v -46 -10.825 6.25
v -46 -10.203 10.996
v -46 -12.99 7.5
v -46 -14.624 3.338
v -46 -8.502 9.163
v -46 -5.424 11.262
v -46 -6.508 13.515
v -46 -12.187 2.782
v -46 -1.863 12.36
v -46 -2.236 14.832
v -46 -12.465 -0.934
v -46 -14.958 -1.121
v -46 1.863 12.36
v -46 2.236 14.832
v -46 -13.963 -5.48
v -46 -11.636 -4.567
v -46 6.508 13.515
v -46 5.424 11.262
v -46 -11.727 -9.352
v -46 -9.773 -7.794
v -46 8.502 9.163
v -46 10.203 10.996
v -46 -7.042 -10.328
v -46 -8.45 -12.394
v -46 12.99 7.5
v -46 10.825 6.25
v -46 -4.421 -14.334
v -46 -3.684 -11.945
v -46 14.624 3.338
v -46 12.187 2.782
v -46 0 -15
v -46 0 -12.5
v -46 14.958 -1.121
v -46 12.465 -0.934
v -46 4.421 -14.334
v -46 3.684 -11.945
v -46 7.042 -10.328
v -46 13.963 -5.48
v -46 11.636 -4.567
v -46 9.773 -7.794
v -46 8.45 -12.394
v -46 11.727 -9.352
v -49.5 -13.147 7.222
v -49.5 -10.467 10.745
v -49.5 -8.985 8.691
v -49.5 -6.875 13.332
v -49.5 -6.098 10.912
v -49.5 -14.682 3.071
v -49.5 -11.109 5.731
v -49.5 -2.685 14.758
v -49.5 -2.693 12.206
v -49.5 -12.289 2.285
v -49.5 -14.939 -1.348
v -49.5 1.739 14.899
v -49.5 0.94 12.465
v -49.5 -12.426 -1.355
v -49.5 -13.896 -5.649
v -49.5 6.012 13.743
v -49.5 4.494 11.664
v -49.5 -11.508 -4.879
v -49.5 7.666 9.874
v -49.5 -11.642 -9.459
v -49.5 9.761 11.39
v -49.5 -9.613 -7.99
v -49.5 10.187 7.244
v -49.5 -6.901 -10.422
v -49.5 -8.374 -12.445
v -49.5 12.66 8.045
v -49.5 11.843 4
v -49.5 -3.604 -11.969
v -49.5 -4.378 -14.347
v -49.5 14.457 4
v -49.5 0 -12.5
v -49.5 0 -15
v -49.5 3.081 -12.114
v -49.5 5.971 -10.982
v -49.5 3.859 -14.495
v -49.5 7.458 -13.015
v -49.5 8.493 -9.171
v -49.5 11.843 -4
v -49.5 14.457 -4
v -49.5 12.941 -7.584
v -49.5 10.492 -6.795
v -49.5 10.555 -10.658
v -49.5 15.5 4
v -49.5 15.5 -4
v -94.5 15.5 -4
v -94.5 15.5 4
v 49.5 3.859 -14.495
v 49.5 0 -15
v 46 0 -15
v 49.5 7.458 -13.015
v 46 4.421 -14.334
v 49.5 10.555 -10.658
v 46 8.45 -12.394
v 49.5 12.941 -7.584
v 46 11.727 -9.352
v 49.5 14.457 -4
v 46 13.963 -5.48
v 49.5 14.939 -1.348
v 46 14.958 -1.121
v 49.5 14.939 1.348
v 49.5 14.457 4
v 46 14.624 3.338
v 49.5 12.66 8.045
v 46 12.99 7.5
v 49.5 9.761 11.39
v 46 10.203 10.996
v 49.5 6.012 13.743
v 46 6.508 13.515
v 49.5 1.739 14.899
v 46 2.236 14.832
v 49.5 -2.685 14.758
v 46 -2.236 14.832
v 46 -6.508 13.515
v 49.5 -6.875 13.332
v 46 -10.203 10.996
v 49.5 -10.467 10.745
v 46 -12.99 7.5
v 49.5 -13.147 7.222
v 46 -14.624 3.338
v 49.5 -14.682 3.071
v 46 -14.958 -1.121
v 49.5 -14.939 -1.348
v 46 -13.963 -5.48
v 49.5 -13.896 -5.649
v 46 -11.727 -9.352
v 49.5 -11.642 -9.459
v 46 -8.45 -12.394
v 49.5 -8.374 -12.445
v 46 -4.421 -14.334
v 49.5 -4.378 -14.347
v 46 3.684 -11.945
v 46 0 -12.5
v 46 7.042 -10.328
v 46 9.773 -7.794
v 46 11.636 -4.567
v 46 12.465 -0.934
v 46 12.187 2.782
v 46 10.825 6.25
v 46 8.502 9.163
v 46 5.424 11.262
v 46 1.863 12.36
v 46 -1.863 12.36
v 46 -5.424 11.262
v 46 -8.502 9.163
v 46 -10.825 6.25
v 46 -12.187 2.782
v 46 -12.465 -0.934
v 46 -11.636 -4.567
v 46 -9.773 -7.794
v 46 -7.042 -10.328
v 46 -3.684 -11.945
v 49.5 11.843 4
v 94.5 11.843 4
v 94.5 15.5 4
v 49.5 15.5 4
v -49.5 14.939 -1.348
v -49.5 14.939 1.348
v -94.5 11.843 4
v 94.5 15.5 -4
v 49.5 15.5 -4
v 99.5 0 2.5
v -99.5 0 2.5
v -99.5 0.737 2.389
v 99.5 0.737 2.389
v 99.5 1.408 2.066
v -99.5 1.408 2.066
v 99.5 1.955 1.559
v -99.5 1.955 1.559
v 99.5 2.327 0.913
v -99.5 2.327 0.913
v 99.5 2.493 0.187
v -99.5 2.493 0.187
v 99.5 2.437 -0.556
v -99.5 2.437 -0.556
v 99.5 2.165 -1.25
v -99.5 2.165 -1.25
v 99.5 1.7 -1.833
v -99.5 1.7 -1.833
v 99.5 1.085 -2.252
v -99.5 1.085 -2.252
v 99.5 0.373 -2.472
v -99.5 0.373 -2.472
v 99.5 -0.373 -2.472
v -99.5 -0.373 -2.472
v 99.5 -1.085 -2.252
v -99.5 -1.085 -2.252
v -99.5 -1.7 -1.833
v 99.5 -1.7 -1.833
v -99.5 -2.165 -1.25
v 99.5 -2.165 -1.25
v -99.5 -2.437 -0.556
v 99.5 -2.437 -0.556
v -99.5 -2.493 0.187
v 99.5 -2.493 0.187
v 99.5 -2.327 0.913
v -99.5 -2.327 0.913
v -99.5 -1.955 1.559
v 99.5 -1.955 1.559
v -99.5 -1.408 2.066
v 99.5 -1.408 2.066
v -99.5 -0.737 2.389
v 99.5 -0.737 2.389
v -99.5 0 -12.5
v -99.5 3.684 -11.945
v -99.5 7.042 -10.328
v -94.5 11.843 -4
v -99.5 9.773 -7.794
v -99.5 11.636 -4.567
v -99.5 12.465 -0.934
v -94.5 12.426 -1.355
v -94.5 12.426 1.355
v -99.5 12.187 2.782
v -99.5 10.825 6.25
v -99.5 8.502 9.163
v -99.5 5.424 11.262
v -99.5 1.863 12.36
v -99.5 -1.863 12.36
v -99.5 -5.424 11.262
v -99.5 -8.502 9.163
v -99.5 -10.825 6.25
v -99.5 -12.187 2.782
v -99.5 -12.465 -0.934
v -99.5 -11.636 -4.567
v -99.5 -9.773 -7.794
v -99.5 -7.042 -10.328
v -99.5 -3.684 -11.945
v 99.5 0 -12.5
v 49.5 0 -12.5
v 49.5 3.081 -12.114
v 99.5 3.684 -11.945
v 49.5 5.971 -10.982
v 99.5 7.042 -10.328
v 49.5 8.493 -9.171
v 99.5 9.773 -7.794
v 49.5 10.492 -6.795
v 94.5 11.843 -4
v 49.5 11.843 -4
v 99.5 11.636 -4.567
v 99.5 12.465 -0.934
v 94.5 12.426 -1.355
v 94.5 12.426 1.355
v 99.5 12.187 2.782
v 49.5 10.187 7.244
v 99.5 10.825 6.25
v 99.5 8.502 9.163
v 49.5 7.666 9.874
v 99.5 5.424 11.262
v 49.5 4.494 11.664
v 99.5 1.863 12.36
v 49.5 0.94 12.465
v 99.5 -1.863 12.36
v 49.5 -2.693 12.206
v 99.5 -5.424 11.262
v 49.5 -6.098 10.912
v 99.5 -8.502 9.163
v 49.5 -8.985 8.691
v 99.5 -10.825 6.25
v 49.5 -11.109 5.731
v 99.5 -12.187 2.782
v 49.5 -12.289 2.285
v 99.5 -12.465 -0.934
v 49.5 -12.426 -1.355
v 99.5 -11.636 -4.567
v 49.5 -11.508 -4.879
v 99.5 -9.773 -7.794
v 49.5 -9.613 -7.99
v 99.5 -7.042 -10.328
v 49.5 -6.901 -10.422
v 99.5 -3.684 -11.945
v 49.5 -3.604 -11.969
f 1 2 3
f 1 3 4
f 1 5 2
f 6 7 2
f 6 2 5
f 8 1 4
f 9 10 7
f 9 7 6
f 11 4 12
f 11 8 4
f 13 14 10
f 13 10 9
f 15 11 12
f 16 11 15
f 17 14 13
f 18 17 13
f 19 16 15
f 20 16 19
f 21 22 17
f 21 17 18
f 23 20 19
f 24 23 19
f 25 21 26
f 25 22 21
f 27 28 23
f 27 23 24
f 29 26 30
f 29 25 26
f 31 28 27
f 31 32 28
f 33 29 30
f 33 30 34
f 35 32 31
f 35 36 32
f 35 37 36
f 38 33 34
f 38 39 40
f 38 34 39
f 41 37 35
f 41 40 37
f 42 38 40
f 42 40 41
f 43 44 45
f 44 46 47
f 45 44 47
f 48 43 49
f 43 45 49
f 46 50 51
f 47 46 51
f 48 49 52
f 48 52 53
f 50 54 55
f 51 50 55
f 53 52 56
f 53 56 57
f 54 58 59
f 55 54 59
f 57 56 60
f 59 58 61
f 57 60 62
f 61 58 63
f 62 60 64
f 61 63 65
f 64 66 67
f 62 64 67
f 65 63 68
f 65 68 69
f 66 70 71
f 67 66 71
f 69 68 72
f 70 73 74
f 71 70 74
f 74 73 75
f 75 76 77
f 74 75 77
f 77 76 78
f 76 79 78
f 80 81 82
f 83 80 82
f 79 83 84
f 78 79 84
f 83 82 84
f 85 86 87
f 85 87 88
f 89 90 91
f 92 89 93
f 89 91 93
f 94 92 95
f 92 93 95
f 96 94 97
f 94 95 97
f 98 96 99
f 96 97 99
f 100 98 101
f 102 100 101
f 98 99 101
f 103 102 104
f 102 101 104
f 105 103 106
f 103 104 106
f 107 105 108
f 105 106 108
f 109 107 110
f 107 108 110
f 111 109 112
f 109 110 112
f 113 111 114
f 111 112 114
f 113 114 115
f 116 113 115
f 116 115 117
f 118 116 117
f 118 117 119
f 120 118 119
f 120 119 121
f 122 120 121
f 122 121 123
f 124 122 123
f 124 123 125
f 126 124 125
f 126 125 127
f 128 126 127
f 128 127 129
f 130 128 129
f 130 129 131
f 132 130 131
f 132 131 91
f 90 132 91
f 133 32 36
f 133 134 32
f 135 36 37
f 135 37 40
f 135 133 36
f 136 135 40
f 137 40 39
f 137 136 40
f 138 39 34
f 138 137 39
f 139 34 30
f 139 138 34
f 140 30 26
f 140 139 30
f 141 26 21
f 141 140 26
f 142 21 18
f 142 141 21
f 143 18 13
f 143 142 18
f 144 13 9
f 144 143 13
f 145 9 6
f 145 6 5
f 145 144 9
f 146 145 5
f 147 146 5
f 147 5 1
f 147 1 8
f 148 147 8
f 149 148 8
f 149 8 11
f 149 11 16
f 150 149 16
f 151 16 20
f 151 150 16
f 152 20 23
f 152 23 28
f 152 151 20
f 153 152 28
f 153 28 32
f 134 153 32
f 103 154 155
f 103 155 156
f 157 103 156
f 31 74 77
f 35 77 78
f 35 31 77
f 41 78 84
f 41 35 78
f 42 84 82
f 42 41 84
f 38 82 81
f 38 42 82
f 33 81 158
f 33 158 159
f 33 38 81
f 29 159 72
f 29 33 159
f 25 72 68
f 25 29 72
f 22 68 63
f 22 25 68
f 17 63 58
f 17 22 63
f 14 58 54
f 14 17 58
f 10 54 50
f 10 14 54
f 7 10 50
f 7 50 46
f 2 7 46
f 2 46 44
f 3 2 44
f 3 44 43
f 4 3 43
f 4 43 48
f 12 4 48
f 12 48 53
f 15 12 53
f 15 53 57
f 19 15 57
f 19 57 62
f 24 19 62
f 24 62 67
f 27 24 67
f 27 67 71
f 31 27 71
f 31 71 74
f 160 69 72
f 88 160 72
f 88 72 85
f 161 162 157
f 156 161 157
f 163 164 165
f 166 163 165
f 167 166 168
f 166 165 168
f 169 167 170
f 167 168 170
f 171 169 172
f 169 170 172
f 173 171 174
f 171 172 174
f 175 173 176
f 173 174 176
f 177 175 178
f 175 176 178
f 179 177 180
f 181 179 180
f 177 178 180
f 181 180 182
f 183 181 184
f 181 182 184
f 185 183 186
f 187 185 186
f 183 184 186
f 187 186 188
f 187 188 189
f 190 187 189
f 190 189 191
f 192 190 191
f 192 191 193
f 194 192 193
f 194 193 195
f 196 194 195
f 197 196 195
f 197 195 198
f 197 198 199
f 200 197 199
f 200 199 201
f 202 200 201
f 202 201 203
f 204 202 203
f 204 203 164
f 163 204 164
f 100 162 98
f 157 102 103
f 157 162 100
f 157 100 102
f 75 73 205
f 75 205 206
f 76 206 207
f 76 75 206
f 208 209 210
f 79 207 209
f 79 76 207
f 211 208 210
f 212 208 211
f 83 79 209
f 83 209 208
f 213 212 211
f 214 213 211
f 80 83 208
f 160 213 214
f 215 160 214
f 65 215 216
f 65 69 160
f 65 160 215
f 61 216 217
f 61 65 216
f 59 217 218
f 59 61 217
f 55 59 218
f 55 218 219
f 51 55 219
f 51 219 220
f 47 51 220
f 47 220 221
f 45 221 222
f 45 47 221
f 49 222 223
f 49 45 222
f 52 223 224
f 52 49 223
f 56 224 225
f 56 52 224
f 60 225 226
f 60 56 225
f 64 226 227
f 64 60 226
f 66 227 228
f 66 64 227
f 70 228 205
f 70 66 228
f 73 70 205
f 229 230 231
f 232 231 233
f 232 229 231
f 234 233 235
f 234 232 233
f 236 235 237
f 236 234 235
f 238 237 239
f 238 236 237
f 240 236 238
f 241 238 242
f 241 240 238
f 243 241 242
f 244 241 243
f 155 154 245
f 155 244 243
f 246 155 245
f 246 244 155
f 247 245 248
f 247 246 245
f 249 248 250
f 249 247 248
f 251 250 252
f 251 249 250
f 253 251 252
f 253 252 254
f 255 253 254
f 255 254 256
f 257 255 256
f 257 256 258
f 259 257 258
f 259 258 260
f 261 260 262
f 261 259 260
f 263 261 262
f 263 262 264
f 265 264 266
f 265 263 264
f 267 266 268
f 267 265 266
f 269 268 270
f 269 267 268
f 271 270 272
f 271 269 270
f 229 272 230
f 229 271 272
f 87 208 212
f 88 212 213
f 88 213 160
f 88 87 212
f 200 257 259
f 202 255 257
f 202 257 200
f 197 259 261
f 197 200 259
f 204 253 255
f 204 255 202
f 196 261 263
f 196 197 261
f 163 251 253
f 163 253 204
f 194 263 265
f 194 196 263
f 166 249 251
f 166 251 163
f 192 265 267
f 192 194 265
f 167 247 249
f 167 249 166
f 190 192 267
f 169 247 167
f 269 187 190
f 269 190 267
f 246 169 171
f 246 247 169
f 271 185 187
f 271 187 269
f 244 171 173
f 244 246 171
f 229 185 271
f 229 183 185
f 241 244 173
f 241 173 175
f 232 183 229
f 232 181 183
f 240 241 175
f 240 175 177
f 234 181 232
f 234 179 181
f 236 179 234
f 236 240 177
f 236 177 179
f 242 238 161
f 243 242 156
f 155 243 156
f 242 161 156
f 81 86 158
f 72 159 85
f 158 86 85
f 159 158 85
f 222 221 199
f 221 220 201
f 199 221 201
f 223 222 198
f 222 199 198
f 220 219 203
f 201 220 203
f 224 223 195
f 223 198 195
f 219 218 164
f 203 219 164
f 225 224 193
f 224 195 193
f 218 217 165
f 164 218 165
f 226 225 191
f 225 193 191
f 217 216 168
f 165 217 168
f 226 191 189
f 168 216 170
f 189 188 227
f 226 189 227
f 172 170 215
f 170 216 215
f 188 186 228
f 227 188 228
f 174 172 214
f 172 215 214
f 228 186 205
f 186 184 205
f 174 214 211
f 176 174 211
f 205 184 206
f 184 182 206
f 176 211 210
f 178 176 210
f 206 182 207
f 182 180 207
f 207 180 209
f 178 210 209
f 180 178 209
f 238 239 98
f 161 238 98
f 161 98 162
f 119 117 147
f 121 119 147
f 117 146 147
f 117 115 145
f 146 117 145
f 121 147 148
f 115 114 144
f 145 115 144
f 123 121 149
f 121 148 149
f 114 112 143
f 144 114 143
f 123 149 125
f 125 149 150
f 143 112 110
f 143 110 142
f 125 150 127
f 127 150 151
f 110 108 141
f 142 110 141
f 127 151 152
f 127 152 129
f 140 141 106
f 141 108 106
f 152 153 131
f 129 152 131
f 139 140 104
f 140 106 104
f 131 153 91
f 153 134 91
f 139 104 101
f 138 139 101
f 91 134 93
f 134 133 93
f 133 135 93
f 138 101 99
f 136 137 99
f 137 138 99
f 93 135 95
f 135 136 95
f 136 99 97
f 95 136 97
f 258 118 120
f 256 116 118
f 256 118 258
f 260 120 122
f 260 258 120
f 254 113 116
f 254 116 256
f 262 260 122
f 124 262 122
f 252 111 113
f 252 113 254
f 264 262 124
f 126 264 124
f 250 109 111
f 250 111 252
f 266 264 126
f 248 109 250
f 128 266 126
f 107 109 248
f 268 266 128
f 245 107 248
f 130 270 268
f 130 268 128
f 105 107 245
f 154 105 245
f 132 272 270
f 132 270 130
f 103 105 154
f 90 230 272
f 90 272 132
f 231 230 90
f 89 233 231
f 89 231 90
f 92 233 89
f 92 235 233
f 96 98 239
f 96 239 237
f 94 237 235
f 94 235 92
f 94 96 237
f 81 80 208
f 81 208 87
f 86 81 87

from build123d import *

# Parameters (mm, degrees)
CROQUIS1_R              = 12.5
SALIENTE_EXTRUIR1_DEPTH = 99.5
CROQUIS2_R              = 15
SALIENTE_EXTRUIR2_DEPTH = 3.5
CROQUIS4_W              = 8
CROQUIS4_H              = 3.657280718
SALIENTE_EXTRUIR3_DEPTH = 45
SALIENTE_EXTRUIR4_START = 99
CROQUIS4_2_W            = 8
CROQUIS4_2_H            = 3.657280718
SALIENTE_EXTRUIR4_DEPTH = 45
SALIENTE_EXTRUIR5_START = -92
CROQUIS2_2_R            = 15
SALIENTE_EXTRUIR5_DEPTH = 3.5
TALADRO_ROSCADO_M61_D   = 5


with BuildPart() as part:
    # Croquis1 → Saliente-Extruir1 (new body, symmetric)
    with BuildSketch(Plane(origin=(0, 0, 0), x_dir=(0, 0, -1), z_dir=(1, 0, 0))):
        Circle(CROQUIS1_R)
    extrude(amount=SALIENTE_EXTRUIR1_DEPTH, both=True)

    # Croquis2 → Saliente-Extruir2 (add)
    with BuildSketch(Plane(origin=(46, 0, 0), x_dir=(0, 0, -1), z_dir=(1, 0, 0))):
        Circle(CROQUIS2_R)
    extrude(amount=SALIENTE_EXTRUIR2_DEPTH)

    # Croquis4 → Saliente-Extruir3 (add)
    with BuildSketch(Plane.ZY.offset(-49.5)):
        with Locations((0, 13.671359641)):
            Rectangle(CROQUIS4_W, CROQUIS4_H)
    extrude(amount=-SALIENTE_EXTRUIR3_DEPTH)

    # Croquis4<2> → Saliente-Extruir4 (add)
    with BuildSketch(Plane.ZY.offset(-49.5).offset(SALIENTE_EXTRUIR4_START)):
        with Locations((0, 13.671359641)):
            Rectangle(CROQUIS4_2_W, CROQUIS4_2_H)
    extrude(amount=SALIENTE_EXTRUIR4_DEPTH)

    # Croquis2<2> → Saliente-Extruir5 (add)
    with BuildSketch(Plane(origin=(46, 0, 0), x_dir=(0, 0, -1), z_dir=(1, 0, 0)).offset(SALIENTE_EXTRUIR5_START)):
        Circle(CROQUIS2_2_R)
    extrude(amount=-SALIENTE_EXTRUIR5_DEPTH)

    # Taladro roscado M61 (through all)
    with Locations(Plane(origin=(99.5, 0, 0), x_dir=(0, 0, -1), z_dir=(1, 0, 0))):
        with Locations((0, 0)):
            Hole(TALADRO_ROSCADO_M61_D / 2)


solid = part.part
